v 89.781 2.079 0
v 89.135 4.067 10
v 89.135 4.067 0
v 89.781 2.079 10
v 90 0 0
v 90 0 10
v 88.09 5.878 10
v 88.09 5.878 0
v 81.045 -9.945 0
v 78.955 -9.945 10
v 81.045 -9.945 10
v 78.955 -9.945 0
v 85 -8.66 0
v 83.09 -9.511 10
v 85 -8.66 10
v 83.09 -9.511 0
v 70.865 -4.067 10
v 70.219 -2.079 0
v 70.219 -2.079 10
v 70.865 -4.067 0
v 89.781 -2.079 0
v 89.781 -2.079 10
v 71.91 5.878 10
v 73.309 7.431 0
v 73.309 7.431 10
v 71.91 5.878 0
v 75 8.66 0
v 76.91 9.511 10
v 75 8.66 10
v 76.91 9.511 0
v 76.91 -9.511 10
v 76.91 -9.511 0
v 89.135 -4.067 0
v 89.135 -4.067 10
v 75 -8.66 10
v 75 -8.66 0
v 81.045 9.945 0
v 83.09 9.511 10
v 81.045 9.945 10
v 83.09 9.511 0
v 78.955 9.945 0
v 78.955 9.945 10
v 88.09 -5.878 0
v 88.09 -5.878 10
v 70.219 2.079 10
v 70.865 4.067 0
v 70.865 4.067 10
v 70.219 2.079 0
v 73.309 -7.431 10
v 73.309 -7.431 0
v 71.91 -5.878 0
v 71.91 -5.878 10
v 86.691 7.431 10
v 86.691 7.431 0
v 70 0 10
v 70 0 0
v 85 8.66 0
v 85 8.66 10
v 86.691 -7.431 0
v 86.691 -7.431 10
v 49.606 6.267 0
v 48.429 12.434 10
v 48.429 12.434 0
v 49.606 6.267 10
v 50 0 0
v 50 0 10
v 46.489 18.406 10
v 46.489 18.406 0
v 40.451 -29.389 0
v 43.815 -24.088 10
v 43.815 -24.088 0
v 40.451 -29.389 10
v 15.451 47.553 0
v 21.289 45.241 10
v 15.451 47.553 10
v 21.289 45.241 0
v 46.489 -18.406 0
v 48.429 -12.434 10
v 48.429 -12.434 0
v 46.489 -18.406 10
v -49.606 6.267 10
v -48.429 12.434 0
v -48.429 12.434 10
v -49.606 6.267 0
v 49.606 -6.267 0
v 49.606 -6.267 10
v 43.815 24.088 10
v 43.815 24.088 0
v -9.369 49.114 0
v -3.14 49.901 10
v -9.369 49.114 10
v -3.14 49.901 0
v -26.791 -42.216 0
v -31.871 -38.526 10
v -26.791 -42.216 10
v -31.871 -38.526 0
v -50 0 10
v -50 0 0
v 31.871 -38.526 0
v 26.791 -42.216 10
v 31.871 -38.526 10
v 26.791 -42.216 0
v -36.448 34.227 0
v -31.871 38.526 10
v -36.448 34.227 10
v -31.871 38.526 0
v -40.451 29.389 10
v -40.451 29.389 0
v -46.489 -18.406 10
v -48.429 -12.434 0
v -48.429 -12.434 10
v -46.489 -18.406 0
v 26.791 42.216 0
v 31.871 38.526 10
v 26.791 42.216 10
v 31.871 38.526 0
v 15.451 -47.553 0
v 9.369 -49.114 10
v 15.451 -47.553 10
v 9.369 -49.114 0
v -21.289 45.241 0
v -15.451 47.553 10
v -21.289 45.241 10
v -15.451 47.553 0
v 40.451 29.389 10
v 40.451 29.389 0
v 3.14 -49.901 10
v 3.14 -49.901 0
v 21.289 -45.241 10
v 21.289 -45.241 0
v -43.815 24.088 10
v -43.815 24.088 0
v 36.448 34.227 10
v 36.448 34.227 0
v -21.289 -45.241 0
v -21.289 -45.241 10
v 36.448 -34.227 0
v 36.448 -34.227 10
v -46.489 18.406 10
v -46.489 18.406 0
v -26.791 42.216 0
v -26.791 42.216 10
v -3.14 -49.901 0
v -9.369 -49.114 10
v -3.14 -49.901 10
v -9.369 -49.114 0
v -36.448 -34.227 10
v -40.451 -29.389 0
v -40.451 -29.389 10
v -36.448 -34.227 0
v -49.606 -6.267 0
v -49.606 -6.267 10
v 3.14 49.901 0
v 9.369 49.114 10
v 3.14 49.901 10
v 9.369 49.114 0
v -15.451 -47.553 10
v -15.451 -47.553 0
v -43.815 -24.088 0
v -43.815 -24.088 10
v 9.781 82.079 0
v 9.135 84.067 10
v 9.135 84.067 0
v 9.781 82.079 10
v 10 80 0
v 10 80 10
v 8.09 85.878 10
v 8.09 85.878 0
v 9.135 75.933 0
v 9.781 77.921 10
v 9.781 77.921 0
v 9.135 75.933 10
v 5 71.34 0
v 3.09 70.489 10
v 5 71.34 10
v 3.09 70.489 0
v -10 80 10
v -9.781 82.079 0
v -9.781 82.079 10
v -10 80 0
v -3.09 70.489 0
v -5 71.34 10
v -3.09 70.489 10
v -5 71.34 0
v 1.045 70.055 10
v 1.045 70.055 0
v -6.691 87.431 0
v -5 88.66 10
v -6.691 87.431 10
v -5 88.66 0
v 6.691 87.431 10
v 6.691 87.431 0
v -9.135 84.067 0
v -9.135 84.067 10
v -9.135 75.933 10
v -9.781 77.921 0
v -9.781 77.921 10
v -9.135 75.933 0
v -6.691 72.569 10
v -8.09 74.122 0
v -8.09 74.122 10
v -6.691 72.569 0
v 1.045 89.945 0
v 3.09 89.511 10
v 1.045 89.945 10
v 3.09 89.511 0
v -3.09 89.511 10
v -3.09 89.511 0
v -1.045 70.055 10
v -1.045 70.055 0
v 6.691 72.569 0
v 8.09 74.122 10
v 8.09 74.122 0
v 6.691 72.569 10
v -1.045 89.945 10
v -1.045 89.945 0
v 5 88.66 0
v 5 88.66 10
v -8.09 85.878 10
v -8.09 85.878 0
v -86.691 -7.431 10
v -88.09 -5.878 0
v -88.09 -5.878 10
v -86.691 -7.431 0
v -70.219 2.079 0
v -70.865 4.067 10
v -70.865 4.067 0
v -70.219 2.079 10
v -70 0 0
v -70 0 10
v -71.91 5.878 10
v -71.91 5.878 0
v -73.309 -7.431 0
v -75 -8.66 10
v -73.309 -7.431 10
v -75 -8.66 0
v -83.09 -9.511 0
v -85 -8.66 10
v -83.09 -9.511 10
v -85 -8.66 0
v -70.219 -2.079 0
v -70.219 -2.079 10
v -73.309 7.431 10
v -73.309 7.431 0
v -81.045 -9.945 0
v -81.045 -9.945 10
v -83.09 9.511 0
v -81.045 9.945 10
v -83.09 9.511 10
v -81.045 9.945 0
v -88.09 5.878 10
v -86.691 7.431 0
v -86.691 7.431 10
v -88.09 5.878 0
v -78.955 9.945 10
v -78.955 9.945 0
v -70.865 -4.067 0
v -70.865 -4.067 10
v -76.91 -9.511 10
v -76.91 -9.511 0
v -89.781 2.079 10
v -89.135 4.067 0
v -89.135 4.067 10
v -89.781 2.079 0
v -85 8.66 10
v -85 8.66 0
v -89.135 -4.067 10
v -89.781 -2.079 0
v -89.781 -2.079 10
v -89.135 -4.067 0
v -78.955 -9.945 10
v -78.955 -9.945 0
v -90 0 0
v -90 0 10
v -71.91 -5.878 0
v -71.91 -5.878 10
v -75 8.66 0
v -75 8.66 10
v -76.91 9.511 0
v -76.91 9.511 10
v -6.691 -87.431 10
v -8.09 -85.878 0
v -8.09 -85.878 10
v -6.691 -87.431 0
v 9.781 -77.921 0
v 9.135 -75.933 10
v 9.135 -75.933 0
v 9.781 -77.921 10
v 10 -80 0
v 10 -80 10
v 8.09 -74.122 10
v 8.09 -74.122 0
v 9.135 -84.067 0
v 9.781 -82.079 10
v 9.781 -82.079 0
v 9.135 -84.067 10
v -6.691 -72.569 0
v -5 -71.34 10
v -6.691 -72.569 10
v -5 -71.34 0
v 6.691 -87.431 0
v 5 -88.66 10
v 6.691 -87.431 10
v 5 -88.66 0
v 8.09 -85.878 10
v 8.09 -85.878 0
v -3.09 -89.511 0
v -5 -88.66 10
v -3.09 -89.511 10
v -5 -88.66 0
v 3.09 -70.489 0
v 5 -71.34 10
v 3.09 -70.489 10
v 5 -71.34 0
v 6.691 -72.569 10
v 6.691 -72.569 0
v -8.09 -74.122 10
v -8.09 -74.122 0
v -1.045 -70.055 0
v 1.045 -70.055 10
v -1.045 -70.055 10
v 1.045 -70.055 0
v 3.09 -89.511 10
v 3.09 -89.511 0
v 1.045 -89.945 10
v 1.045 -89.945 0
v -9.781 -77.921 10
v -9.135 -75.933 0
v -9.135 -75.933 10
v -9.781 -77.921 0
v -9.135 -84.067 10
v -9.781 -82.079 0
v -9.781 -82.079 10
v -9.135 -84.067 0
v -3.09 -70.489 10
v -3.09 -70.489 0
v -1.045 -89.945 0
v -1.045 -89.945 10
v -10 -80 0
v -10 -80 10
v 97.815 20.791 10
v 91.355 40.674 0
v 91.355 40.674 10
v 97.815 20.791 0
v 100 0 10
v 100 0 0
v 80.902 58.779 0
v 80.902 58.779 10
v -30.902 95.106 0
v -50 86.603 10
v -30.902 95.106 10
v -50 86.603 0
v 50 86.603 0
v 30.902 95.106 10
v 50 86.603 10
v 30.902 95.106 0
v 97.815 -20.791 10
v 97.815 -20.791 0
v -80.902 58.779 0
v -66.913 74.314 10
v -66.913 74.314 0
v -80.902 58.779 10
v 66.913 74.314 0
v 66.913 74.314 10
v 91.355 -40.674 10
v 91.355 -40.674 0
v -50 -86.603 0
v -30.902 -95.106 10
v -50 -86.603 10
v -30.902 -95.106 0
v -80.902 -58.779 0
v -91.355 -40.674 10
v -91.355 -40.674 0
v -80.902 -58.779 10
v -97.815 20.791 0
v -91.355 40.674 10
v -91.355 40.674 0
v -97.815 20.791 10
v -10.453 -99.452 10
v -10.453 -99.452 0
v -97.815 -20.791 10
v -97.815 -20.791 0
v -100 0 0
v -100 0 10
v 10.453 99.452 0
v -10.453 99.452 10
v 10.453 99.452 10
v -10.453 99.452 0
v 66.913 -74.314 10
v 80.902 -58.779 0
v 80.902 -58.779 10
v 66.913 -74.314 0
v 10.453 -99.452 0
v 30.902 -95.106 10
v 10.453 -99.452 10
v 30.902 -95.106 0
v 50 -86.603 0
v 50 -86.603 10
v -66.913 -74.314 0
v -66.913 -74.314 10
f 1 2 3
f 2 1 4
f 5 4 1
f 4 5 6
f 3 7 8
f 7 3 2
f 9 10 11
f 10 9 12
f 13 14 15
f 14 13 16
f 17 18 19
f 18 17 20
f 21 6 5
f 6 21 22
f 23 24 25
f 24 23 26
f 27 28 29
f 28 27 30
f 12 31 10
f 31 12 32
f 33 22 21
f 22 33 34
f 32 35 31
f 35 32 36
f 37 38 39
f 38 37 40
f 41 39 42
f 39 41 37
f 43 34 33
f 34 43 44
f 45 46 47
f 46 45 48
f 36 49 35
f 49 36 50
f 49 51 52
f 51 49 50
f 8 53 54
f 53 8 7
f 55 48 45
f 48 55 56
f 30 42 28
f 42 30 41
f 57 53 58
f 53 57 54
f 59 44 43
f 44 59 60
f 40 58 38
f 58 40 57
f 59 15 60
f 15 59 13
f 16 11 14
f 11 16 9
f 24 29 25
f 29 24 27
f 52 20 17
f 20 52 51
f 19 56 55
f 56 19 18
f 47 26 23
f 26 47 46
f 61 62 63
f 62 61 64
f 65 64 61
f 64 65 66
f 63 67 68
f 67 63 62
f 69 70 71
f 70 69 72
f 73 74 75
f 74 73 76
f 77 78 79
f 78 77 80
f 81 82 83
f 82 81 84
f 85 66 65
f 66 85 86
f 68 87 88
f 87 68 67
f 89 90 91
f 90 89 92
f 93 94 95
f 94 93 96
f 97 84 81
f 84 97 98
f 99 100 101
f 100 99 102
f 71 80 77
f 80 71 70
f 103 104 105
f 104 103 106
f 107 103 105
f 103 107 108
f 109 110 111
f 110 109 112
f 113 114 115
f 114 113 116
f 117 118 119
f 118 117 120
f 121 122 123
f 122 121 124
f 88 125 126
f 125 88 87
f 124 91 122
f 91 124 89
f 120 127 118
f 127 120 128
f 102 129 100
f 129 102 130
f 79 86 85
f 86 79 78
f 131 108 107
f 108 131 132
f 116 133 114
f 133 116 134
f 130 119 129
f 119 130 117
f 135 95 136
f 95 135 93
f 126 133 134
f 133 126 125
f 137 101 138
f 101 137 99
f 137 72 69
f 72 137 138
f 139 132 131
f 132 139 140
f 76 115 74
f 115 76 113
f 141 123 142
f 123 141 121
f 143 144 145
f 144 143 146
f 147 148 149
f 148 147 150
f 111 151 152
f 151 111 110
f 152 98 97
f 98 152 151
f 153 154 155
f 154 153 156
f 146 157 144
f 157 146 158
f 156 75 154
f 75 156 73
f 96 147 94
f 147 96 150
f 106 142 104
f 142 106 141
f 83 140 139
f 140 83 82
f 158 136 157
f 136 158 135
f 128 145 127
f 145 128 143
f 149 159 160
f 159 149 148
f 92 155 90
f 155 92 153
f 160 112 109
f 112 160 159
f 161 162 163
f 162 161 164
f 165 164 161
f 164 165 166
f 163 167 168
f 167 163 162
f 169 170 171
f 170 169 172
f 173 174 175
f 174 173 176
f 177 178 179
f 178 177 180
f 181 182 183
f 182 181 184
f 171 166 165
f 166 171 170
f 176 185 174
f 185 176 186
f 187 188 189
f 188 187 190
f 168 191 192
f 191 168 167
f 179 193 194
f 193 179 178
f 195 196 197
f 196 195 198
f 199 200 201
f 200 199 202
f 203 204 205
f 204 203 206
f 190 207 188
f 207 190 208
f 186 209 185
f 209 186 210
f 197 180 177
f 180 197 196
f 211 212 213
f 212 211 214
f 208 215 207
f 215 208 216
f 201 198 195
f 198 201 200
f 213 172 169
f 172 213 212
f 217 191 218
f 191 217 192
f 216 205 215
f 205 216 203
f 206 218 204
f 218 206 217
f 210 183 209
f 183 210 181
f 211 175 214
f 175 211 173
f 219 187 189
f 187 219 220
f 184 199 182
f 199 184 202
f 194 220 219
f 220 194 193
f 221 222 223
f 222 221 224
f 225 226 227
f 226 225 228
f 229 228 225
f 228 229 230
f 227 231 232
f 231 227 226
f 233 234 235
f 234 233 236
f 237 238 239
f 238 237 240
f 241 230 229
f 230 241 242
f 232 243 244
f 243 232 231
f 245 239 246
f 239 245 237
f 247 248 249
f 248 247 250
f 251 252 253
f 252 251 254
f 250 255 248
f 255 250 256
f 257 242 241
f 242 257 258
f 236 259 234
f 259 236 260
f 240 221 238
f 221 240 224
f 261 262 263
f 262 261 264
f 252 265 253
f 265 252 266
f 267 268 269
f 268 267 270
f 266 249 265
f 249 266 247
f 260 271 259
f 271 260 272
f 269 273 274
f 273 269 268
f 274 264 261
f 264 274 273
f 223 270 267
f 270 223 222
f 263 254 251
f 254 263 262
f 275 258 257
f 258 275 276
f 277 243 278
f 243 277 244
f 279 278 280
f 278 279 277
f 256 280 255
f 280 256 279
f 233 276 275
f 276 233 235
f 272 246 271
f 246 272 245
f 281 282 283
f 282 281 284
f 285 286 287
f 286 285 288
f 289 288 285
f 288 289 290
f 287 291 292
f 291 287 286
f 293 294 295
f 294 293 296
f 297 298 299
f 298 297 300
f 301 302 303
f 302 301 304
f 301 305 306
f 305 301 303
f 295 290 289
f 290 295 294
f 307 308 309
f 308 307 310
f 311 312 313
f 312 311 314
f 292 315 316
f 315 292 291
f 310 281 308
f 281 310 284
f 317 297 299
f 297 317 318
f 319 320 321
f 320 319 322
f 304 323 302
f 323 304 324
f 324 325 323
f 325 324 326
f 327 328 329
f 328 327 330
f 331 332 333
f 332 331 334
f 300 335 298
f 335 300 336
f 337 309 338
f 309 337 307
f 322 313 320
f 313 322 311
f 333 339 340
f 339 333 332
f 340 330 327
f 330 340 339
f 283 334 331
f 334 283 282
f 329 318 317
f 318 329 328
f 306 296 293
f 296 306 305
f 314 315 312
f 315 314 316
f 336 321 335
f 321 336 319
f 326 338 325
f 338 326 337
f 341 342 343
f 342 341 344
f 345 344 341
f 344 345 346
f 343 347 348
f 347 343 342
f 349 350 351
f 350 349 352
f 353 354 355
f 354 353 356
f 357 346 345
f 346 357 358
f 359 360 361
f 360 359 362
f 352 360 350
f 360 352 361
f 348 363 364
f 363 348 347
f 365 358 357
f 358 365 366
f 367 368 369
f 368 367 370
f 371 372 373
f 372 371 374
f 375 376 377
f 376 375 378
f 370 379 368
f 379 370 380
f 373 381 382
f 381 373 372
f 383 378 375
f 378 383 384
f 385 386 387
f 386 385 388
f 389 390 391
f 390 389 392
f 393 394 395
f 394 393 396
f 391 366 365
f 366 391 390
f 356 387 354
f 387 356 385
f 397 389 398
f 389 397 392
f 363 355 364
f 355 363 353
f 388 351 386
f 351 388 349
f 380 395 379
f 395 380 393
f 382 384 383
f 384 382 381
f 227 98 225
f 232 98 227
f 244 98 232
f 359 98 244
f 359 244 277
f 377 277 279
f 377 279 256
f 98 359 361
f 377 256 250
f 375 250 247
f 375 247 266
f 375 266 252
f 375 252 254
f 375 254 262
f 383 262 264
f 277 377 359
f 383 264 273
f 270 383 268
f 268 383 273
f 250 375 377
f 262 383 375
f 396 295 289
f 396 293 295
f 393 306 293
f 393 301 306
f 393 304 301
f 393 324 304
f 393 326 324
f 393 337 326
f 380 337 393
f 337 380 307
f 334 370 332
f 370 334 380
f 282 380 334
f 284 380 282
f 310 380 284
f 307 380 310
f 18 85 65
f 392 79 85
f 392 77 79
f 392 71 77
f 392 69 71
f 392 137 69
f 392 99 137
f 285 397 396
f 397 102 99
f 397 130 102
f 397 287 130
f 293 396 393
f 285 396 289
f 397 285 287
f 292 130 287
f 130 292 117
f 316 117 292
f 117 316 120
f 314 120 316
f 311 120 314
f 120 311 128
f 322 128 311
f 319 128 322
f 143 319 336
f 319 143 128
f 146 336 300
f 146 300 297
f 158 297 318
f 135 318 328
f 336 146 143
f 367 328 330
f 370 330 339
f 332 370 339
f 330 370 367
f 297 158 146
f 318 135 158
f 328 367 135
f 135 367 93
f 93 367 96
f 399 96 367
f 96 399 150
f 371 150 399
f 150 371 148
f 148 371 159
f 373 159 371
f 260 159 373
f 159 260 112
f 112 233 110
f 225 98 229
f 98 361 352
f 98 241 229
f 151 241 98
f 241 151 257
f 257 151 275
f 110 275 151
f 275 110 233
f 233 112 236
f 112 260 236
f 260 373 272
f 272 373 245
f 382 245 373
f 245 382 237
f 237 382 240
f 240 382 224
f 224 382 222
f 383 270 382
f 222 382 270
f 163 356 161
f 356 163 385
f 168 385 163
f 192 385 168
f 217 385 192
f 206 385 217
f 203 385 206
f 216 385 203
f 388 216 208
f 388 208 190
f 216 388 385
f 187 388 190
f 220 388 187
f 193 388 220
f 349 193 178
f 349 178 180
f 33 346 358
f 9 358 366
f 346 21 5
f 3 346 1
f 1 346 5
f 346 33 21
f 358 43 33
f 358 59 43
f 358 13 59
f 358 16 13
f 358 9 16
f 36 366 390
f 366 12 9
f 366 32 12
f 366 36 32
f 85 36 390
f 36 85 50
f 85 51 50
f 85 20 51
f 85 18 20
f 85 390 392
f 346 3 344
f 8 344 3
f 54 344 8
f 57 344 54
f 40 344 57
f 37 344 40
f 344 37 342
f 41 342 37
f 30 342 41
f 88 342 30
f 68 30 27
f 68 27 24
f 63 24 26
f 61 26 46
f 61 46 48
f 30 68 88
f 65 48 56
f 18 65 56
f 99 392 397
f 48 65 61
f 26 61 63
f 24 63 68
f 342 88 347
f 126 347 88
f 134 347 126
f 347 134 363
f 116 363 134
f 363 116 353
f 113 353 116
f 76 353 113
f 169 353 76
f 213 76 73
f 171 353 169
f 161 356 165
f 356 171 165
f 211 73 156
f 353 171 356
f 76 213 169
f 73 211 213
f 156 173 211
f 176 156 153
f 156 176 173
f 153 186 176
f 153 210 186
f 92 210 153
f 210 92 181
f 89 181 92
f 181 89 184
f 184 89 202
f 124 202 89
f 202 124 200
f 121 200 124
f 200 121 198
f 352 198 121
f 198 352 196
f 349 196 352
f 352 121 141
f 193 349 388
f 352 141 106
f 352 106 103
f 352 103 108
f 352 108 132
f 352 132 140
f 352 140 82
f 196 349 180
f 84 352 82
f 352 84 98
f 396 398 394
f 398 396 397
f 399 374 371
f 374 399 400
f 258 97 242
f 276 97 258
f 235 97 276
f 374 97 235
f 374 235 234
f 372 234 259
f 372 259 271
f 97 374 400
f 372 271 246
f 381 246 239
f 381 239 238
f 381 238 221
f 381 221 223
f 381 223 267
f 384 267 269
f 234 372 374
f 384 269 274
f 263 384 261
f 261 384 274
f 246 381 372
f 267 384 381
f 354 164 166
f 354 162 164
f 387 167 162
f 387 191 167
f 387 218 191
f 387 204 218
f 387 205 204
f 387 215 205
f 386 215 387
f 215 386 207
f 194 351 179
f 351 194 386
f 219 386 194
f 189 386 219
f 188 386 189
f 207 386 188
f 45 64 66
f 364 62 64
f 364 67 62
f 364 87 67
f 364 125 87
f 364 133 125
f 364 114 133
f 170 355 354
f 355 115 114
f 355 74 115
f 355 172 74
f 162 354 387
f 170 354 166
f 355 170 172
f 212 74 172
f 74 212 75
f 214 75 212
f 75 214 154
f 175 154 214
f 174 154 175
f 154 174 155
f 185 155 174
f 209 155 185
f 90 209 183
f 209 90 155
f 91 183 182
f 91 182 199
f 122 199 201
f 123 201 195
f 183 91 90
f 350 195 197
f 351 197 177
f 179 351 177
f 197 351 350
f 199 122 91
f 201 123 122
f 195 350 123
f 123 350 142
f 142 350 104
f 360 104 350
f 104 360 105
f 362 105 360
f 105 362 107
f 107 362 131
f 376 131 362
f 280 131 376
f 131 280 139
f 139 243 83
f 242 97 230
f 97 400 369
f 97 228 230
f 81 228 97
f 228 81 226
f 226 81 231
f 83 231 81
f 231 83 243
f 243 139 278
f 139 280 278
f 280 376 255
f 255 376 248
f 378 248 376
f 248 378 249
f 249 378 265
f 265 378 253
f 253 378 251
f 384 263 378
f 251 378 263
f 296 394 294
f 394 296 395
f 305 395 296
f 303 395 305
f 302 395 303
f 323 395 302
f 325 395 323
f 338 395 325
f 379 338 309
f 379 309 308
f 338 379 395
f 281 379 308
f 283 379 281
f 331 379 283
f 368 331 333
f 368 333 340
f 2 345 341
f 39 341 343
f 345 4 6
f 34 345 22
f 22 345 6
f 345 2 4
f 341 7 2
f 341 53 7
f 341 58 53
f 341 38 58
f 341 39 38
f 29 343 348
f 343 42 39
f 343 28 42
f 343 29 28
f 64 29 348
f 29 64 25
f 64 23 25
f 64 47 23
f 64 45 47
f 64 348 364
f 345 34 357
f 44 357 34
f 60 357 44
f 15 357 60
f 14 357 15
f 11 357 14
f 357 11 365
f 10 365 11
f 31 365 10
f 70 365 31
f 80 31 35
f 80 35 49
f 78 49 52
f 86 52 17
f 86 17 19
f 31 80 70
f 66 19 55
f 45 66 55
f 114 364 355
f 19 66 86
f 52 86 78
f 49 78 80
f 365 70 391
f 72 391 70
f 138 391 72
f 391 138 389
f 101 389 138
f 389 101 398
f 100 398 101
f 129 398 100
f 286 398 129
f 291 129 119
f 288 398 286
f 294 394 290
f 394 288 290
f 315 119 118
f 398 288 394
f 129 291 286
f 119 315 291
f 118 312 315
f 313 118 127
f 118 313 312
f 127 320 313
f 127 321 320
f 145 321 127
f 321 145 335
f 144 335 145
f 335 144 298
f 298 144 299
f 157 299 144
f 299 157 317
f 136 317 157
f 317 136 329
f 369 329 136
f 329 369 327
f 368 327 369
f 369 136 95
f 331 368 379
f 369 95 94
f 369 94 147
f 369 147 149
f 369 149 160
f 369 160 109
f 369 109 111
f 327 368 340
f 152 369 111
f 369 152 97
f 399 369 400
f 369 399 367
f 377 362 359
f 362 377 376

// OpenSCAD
module Flange_01(){

    color("#c0c6c7")
    difference(){
        cylinder(10,100,100,$fn=30);

        r = 80;
        for (i=[0:90:359]) {
            translate([r*cos(i),r*sin(i),-1])
            cylinder(12,10,10,$fn=30);
            translate([0,0,-1]) 
            cylinder(12,50,50,$fn=50);   
        }

    }

}

Flange_01();

// Written by Nicolì Angelo (Gengio) 2024: 
// MIT License

//Permission is hereby granted, free of charge, to any person obtaining a copy of this software and associated documentation files (the "Software"), to deal in the Software without restriction, including without limitation the rights to use, copy, modify, merge, publish, distribute, sublicense, and/or sell copies of the Software, and to permit persons to whom the Software is furnished to do so, subject to the following conditions:

//The above copyright notice and this permission notice shall be included in all copies or substantial portions of the Software.

//THE SOFTWARE IS PROVIDED "AS IS", WITHOUT WARRANTY OF ANY KIND, EXPRESS OR IMPLIED, INCLUDING BUT NOT LIMITED TO THE WARRANTIES OF MERCHANTABILITY, FITNESS FOR A PARTICULAR PURPOSE AND NONINFRINGEMENT. IN NO EVENT SHALL THE AUTHORS OR COPYRIGHT HOLDERS BE LIABLE FOR ANY CLAIM, DAMAGES OR OTHER LIABILITY, WHETHER IN AN ACTION OF CONTRACT, TORT OR OTHERWISE, ARISING FROM, OUT OF OR IN CONNECTION WITH THE SOFTWARE OR THE USE OR OTHER DEALINGS IN THE SOFTWARE.
